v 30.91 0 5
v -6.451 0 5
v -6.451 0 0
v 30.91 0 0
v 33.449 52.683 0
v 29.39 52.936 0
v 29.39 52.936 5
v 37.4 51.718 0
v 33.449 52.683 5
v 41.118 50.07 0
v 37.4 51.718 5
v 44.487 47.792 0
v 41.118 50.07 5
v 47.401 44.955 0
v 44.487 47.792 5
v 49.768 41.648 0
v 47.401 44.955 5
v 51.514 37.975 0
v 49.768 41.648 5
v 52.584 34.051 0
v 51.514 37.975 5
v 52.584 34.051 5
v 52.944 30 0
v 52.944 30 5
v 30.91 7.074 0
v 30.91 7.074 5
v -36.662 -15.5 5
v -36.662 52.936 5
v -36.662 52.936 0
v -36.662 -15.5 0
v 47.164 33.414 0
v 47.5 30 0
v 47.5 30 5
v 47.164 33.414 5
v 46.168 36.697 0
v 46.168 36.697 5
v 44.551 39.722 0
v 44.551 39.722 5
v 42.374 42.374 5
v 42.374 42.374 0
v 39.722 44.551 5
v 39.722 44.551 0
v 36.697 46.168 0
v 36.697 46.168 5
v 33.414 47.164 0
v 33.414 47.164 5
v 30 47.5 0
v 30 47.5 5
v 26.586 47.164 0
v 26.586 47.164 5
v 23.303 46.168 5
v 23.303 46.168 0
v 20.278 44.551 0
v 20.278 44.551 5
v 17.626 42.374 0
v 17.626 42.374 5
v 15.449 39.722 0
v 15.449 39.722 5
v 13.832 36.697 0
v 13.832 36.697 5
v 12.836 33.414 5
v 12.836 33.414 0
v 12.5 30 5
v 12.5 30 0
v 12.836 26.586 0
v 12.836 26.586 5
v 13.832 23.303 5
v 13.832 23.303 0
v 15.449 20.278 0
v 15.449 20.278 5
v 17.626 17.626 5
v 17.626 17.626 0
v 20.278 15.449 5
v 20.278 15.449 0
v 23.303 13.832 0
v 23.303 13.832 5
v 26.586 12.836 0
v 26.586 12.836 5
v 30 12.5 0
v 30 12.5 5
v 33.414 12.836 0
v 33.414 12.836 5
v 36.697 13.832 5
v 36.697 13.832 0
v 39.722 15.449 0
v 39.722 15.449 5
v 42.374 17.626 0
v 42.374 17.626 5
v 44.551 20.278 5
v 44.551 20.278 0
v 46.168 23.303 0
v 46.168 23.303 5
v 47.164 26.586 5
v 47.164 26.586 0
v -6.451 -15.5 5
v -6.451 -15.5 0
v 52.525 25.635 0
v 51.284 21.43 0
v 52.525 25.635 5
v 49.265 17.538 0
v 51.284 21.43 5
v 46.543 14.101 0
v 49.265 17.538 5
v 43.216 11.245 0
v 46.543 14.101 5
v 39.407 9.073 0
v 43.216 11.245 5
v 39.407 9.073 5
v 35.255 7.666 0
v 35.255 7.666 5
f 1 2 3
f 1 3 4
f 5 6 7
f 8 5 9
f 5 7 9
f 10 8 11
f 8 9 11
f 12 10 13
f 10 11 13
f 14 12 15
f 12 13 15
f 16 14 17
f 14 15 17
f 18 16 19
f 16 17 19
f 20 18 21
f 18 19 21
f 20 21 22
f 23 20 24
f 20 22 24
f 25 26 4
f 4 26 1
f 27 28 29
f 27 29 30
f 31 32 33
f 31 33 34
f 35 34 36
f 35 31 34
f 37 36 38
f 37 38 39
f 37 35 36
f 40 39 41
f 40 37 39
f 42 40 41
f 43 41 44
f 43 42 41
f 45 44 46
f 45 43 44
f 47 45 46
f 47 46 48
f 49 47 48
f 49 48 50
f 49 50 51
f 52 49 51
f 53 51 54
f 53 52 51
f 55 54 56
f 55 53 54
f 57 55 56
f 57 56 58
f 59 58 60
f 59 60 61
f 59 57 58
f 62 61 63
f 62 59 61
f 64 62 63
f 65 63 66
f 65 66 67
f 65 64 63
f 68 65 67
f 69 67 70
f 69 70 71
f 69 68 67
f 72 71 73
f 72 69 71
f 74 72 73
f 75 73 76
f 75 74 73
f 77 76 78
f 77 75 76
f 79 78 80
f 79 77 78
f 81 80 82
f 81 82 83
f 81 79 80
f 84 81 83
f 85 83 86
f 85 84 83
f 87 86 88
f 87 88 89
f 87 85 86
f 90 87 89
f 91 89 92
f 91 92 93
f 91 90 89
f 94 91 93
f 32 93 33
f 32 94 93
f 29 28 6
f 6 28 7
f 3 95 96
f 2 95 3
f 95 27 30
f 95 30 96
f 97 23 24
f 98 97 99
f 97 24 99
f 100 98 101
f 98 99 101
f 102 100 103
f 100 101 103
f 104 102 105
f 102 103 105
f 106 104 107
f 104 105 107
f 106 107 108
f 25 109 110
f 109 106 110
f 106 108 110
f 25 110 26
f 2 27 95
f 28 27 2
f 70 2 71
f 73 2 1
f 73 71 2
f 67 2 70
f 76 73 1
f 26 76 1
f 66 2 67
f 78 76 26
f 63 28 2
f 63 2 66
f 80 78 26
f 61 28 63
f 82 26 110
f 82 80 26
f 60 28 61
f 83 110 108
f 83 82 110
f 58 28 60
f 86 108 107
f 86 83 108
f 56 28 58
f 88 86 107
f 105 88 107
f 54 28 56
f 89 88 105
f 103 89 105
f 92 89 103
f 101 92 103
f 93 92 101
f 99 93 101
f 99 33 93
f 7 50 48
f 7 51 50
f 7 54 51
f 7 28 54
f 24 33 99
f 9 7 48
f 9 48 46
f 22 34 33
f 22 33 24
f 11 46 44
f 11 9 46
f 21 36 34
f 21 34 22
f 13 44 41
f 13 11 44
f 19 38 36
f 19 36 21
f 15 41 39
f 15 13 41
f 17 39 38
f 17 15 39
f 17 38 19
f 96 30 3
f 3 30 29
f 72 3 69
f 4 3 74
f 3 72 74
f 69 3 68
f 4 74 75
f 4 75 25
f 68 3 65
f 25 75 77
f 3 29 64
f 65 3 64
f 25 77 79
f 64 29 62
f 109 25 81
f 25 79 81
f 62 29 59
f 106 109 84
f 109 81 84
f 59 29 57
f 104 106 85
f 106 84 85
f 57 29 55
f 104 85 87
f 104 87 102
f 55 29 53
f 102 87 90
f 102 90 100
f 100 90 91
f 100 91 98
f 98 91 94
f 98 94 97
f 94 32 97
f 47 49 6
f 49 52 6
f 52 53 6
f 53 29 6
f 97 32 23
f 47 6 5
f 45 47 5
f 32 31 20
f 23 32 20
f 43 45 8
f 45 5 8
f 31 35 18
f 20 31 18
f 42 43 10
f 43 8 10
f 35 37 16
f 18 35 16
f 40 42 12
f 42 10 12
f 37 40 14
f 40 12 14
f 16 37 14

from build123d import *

# Parameters (mm, degrees)
F0_R     = 17.5
F1_DEPTH = 5
F2_W     = 6.4513552934
F2_H     = 36.834217608
F3_DEPTH = 5
F4_W     = 12.2471041977
F4_H     = 55.2336238325
F5_DEPTH = 25
F7_DEPTH = 25
F8_W     = 30.2105266601
F8_H     = 23.1209599674
F9_DEPTH = 25


with BuildPart() as f1:
    # F0 (on Top) → F1 (new body)
    with BuildSketch(Plane.XY):
        with BuildLine():
            Line((0, 50.2336238325), (0, 0))
            Line((0, 0), (60, 0))
            Line((60, 0), (60, 50.2336238325))
            ThreePointArc((60, 50.2336238325), (58.5355339059, 53.7691577384), (55, 55.2336238325))
            Line((55, 55.2336238325), (5, 55.2336238325))
            ThreePointArc((5, 55.2336238325), (1.4644660941, 53.7691577384), (0, 50.2336238325))
        make_face()
        with Locations((30, 30)):
            Circle(F0_R, mode=Mode.SUBTRACT)
    extrude(amount=F1_DEPTH)

    # F2 (on face) → F3 (join)
    with BuildSketch(Plane.XY.offset(5)):
        with Locations((-3.2256776467, 18.417108804)):
            Rectangle(F2_W, F2_H)
        with BuildLine():
            Line((-6.4513552934, 36.834217608), (0, 36.834217608))
            Line((0, 36.834217608), (0, 50.2336238325))
            ThreePointArc((0, 50.2336238325), (1.4644660941, 53.7691577384), (5, 55.2336238325))
            Line((5, 55.2336238325), (-36.6618819535, 55.2336238325))
            Line((-36.6618819535, 55.2336238325), (-36.6618819535, -38.6209599674))
            Line((-36.6618819535, -38.6209599674), (-6.4513552934, -38.6209599674))
            Line((-6.4513552934, -38.6209599674), (-6.4513552934, 0))
            Line((-6.4513552934, 0), (-6.4513552934, 36.834217608))
        make_face()
    extrude(amount=-F3_DEPTH)

    # F4 (on face) → F5 (cut)
    with BuildSketch(Plane.XY.offset(5)):
        with Locations((60.3161063045, 27.6168119162)):
            Rectangle(F4_W, F4_H)
    extrude(amount=-F5_DEPTH, mode=Mode.SUBTRACT)

    # F6 (on face) → F7 (cut)
    with BuildSketch(Plane.XY.offset(5)):
        with BuildLine():
            ThreePointArc((29.3901374458, 52.9360723045), (46.0069133431, 46.4381893869), (52.9441788934, 30))
            ThreePointArc((52.9441788934, 30), (46.542618257, 14.1010337978), (30.910082361, 7.0738774498))
            Line((30.910082361, 7.0738774498), (30.910082361, 0))
            Line((30.910082361, 0), (54.1925542057, 0))
            Line((54.1925542057, 0), (54.1925542057, 55.2336238325))
            Line((54.1925542057, 55.2336238325), (-36.6618819535, 55.2336238325))
            Line((-36.6618819535, 55.2336238325), (-36.6618819535, 52.9360723045))
            Line((-36.6618819535, 52.9360723045), (29.3901374458, 52.9360723045))
        make_face()
    extrude(amount=-F7_DEPTH, mode=Mode.SUBTRACT)

    # F8 (on face) → F9 (cut)
    with BuildSketch(Plane.XY.offset(5)):
        with Locations((-21.5566186234, -27.0604799837)):
            Rectangle(F8_W, F8_H)
    extrude(amount=-F9_DEPTH, mode=Mode.SUBTRACT)


solid = f1.part
